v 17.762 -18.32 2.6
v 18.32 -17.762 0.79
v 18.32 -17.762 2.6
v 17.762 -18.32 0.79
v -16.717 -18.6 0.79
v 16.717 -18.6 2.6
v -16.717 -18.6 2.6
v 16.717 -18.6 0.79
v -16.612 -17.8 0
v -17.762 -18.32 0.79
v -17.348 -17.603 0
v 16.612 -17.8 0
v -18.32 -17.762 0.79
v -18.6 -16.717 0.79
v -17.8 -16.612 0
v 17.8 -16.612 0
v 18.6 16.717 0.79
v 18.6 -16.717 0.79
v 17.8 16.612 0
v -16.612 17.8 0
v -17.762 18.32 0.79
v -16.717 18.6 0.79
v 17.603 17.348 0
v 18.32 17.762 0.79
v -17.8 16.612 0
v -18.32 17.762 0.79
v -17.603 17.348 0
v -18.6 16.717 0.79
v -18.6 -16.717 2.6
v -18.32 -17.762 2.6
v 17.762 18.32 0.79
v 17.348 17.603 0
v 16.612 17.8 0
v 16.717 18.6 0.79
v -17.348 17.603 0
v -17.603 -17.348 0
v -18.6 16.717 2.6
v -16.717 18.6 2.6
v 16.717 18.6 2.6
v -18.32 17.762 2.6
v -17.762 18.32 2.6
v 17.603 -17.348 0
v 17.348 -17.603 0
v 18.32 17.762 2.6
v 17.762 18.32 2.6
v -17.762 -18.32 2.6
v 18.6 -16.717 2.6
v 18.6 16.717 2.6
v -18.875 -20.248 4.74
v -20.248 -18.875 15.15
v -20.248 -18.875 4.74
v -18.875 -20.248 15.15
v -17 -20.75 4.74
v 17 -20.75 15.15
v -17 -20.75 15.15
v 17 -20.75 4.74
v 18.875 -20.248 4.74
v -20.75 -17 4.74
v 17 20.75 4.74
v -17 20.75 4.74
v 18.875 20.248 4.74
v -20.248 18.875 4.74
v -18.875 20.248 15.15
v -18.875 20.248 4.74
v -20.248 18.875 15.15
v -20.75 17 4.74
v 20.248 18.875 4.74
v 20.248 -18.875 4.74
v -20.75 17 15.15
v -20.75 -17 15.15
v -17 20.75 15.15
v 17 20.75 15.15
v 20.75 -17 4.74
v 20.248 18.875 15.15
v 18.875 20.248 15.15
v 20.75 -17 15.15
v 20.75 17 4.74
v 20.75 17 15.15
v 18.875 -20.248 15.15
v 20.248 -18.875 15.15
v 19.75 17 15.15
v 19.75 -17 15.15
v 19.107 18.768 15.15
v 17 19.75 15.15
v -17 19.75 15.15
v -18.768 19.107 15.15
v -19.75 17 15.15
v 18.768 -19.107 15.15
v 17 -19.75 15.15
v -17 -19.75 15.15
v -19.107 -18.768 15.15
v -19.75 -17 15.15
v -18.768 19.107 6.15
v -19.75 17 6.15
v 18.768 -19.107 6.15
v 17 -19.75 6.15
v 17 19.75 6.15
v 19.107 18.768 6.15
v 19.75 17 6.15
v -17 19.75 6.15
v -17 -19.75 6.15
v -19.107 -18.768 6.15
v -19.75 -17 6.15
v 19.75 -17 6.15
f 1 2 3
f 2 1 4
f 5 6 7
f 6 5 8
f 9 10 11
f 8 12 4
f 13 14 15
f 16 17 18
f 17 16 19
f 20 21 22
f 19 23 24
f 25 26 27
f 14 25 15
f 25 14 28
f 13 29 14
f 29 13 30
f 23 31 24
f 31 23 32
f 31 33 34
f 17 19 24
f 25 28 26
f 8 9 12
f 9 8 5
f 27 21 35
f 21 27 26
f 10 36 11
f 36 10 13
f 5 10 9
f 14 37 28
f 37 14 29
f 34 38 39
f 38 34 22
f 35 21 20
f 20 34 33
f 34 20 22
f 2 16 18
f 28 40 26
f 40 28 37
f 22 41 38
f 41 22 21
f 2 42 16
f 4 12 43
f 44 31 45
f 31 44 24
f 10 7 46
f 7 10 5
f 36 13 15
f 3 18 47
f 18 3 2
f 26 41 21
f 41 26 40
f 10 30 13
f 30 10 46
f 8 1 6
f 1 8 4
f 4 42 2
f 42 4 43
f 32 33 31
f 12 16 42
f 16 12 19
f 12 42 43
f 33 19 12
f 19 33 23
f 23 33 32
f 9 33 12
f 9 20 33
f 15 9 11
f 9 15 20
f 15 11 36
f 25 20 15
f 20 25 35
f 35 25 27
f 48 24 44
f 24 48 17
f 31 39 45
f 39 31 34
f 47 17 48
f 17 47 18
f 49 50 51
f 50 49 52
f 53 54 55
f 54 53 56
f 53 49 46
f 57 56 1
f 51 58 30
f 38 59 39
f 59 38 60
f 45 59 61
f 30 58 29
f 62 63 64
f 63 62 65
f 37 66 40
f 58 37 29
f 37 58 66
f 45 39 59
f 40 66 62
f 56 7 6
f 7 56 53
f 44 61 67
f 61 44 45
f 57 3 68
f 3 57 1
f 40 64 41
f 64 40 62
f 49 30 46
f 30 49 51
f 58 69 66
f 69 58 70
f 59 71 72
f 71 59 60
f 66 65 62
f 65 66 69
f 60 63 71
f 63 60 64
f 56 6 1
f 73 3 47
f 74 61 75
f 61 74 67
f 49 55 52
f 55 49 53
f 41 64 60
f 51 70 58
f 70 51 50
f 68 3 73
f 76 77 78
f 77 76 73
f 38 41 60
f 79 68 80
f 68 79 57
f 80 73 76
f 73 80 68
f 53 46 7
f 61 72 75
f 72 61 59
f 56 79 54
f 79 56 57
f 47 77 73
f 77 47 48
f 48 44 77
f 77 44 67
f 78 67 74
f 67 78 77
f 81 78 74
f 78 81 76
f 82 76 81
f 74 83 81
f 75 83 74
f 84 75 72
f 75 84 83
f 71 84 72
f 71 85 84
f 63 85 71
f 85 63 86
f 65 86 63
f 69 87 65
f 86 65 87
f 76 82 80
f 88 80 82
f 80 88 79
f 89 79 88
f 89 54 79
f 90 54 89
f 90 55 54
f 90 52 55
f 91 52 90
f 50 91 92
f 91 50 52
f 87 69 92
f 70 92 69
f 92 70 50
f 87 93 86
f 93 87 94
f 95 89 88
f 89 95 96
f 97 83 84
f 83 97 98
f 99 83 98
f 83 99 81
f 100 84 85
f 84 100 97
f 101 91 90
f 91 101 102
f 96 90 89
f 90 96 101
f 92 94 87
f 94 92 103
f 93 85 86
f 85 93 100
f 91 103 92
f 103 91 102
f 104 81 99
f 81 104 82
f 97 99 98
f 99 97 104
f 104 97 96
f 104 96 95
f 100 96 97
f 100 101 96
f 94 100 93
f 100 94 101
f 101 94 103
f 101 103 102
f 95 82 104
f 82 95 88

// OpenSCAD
// bin_tip_tinner — 1×1 bin for the tip tinner tin.
//
// The tin measures 42.5 across the LID and 38.38 across the BODY. The lid is the
// number that misleads: 42.5 is wider than a 1×1's entire 41.5 mm footprint, so
// sized off it this looked like a 2×2 part. The body is what goes inside.
//
// Stored lid-on. The 10.15 mm body drops in and lands on the floor; the lid sits
// proud where you can grab it. The bin never needs to be as deep as the whole
// 17 mm tin.
//
// Wall is 1.0 rather than the usual 1.2: at 1.2 the interior is 39.1 against a
// 38.38 tin, which is 0.36 mm a side — tight enough that a slightly thick-walled
// print would refuse it. 1.0 gives 39.5 and a comfortable drop-in.
//
// PRINT: as emitted, feet down. No supports.
include <../lib/gridfinity.scad>

D_TIP_TINNER_LID  = 42.50;   // measured 2026-08-20 — does NOT set the bin size
D_TIP_TINNER_BODY = 38.38;   // measured — this is the one that matters
H_TIP_TINNER      = 17.00;   // lid on
H_BODY            = 10.15;   // measured — base to where the lid starts

WALL  = 1.0;
// Deliberately just UNDER the 10.15 body height. Deeper and the lid's 42.5 rim
// catches on the bin rim first, leaving the tin hanging with air beneath it and
// free to rock. At 9 the body lands on the floor and the lid sits 1.15 mm proud.
// The lid also overhangs the bin's outer wall by 0.5 mm a side, so there is a
// fingernail's purchase on it regardless of depth.
DEPTH = 9;    // [6:0.5:14]

assert(41.5 - 2*WALL > D_TIP_TINNER_BODY,
       "Tin body is wider than the 1x1 interior — thin the wall or go 2x2.");

assert(DEPTH < H_BODY,
       "Depth exceeds the tin body — it would hang from the lid instead of sitting on the floor.");

bin(1, 1, BIN_BASE_H + 1.4 + DEPTH, wall = WALL);
